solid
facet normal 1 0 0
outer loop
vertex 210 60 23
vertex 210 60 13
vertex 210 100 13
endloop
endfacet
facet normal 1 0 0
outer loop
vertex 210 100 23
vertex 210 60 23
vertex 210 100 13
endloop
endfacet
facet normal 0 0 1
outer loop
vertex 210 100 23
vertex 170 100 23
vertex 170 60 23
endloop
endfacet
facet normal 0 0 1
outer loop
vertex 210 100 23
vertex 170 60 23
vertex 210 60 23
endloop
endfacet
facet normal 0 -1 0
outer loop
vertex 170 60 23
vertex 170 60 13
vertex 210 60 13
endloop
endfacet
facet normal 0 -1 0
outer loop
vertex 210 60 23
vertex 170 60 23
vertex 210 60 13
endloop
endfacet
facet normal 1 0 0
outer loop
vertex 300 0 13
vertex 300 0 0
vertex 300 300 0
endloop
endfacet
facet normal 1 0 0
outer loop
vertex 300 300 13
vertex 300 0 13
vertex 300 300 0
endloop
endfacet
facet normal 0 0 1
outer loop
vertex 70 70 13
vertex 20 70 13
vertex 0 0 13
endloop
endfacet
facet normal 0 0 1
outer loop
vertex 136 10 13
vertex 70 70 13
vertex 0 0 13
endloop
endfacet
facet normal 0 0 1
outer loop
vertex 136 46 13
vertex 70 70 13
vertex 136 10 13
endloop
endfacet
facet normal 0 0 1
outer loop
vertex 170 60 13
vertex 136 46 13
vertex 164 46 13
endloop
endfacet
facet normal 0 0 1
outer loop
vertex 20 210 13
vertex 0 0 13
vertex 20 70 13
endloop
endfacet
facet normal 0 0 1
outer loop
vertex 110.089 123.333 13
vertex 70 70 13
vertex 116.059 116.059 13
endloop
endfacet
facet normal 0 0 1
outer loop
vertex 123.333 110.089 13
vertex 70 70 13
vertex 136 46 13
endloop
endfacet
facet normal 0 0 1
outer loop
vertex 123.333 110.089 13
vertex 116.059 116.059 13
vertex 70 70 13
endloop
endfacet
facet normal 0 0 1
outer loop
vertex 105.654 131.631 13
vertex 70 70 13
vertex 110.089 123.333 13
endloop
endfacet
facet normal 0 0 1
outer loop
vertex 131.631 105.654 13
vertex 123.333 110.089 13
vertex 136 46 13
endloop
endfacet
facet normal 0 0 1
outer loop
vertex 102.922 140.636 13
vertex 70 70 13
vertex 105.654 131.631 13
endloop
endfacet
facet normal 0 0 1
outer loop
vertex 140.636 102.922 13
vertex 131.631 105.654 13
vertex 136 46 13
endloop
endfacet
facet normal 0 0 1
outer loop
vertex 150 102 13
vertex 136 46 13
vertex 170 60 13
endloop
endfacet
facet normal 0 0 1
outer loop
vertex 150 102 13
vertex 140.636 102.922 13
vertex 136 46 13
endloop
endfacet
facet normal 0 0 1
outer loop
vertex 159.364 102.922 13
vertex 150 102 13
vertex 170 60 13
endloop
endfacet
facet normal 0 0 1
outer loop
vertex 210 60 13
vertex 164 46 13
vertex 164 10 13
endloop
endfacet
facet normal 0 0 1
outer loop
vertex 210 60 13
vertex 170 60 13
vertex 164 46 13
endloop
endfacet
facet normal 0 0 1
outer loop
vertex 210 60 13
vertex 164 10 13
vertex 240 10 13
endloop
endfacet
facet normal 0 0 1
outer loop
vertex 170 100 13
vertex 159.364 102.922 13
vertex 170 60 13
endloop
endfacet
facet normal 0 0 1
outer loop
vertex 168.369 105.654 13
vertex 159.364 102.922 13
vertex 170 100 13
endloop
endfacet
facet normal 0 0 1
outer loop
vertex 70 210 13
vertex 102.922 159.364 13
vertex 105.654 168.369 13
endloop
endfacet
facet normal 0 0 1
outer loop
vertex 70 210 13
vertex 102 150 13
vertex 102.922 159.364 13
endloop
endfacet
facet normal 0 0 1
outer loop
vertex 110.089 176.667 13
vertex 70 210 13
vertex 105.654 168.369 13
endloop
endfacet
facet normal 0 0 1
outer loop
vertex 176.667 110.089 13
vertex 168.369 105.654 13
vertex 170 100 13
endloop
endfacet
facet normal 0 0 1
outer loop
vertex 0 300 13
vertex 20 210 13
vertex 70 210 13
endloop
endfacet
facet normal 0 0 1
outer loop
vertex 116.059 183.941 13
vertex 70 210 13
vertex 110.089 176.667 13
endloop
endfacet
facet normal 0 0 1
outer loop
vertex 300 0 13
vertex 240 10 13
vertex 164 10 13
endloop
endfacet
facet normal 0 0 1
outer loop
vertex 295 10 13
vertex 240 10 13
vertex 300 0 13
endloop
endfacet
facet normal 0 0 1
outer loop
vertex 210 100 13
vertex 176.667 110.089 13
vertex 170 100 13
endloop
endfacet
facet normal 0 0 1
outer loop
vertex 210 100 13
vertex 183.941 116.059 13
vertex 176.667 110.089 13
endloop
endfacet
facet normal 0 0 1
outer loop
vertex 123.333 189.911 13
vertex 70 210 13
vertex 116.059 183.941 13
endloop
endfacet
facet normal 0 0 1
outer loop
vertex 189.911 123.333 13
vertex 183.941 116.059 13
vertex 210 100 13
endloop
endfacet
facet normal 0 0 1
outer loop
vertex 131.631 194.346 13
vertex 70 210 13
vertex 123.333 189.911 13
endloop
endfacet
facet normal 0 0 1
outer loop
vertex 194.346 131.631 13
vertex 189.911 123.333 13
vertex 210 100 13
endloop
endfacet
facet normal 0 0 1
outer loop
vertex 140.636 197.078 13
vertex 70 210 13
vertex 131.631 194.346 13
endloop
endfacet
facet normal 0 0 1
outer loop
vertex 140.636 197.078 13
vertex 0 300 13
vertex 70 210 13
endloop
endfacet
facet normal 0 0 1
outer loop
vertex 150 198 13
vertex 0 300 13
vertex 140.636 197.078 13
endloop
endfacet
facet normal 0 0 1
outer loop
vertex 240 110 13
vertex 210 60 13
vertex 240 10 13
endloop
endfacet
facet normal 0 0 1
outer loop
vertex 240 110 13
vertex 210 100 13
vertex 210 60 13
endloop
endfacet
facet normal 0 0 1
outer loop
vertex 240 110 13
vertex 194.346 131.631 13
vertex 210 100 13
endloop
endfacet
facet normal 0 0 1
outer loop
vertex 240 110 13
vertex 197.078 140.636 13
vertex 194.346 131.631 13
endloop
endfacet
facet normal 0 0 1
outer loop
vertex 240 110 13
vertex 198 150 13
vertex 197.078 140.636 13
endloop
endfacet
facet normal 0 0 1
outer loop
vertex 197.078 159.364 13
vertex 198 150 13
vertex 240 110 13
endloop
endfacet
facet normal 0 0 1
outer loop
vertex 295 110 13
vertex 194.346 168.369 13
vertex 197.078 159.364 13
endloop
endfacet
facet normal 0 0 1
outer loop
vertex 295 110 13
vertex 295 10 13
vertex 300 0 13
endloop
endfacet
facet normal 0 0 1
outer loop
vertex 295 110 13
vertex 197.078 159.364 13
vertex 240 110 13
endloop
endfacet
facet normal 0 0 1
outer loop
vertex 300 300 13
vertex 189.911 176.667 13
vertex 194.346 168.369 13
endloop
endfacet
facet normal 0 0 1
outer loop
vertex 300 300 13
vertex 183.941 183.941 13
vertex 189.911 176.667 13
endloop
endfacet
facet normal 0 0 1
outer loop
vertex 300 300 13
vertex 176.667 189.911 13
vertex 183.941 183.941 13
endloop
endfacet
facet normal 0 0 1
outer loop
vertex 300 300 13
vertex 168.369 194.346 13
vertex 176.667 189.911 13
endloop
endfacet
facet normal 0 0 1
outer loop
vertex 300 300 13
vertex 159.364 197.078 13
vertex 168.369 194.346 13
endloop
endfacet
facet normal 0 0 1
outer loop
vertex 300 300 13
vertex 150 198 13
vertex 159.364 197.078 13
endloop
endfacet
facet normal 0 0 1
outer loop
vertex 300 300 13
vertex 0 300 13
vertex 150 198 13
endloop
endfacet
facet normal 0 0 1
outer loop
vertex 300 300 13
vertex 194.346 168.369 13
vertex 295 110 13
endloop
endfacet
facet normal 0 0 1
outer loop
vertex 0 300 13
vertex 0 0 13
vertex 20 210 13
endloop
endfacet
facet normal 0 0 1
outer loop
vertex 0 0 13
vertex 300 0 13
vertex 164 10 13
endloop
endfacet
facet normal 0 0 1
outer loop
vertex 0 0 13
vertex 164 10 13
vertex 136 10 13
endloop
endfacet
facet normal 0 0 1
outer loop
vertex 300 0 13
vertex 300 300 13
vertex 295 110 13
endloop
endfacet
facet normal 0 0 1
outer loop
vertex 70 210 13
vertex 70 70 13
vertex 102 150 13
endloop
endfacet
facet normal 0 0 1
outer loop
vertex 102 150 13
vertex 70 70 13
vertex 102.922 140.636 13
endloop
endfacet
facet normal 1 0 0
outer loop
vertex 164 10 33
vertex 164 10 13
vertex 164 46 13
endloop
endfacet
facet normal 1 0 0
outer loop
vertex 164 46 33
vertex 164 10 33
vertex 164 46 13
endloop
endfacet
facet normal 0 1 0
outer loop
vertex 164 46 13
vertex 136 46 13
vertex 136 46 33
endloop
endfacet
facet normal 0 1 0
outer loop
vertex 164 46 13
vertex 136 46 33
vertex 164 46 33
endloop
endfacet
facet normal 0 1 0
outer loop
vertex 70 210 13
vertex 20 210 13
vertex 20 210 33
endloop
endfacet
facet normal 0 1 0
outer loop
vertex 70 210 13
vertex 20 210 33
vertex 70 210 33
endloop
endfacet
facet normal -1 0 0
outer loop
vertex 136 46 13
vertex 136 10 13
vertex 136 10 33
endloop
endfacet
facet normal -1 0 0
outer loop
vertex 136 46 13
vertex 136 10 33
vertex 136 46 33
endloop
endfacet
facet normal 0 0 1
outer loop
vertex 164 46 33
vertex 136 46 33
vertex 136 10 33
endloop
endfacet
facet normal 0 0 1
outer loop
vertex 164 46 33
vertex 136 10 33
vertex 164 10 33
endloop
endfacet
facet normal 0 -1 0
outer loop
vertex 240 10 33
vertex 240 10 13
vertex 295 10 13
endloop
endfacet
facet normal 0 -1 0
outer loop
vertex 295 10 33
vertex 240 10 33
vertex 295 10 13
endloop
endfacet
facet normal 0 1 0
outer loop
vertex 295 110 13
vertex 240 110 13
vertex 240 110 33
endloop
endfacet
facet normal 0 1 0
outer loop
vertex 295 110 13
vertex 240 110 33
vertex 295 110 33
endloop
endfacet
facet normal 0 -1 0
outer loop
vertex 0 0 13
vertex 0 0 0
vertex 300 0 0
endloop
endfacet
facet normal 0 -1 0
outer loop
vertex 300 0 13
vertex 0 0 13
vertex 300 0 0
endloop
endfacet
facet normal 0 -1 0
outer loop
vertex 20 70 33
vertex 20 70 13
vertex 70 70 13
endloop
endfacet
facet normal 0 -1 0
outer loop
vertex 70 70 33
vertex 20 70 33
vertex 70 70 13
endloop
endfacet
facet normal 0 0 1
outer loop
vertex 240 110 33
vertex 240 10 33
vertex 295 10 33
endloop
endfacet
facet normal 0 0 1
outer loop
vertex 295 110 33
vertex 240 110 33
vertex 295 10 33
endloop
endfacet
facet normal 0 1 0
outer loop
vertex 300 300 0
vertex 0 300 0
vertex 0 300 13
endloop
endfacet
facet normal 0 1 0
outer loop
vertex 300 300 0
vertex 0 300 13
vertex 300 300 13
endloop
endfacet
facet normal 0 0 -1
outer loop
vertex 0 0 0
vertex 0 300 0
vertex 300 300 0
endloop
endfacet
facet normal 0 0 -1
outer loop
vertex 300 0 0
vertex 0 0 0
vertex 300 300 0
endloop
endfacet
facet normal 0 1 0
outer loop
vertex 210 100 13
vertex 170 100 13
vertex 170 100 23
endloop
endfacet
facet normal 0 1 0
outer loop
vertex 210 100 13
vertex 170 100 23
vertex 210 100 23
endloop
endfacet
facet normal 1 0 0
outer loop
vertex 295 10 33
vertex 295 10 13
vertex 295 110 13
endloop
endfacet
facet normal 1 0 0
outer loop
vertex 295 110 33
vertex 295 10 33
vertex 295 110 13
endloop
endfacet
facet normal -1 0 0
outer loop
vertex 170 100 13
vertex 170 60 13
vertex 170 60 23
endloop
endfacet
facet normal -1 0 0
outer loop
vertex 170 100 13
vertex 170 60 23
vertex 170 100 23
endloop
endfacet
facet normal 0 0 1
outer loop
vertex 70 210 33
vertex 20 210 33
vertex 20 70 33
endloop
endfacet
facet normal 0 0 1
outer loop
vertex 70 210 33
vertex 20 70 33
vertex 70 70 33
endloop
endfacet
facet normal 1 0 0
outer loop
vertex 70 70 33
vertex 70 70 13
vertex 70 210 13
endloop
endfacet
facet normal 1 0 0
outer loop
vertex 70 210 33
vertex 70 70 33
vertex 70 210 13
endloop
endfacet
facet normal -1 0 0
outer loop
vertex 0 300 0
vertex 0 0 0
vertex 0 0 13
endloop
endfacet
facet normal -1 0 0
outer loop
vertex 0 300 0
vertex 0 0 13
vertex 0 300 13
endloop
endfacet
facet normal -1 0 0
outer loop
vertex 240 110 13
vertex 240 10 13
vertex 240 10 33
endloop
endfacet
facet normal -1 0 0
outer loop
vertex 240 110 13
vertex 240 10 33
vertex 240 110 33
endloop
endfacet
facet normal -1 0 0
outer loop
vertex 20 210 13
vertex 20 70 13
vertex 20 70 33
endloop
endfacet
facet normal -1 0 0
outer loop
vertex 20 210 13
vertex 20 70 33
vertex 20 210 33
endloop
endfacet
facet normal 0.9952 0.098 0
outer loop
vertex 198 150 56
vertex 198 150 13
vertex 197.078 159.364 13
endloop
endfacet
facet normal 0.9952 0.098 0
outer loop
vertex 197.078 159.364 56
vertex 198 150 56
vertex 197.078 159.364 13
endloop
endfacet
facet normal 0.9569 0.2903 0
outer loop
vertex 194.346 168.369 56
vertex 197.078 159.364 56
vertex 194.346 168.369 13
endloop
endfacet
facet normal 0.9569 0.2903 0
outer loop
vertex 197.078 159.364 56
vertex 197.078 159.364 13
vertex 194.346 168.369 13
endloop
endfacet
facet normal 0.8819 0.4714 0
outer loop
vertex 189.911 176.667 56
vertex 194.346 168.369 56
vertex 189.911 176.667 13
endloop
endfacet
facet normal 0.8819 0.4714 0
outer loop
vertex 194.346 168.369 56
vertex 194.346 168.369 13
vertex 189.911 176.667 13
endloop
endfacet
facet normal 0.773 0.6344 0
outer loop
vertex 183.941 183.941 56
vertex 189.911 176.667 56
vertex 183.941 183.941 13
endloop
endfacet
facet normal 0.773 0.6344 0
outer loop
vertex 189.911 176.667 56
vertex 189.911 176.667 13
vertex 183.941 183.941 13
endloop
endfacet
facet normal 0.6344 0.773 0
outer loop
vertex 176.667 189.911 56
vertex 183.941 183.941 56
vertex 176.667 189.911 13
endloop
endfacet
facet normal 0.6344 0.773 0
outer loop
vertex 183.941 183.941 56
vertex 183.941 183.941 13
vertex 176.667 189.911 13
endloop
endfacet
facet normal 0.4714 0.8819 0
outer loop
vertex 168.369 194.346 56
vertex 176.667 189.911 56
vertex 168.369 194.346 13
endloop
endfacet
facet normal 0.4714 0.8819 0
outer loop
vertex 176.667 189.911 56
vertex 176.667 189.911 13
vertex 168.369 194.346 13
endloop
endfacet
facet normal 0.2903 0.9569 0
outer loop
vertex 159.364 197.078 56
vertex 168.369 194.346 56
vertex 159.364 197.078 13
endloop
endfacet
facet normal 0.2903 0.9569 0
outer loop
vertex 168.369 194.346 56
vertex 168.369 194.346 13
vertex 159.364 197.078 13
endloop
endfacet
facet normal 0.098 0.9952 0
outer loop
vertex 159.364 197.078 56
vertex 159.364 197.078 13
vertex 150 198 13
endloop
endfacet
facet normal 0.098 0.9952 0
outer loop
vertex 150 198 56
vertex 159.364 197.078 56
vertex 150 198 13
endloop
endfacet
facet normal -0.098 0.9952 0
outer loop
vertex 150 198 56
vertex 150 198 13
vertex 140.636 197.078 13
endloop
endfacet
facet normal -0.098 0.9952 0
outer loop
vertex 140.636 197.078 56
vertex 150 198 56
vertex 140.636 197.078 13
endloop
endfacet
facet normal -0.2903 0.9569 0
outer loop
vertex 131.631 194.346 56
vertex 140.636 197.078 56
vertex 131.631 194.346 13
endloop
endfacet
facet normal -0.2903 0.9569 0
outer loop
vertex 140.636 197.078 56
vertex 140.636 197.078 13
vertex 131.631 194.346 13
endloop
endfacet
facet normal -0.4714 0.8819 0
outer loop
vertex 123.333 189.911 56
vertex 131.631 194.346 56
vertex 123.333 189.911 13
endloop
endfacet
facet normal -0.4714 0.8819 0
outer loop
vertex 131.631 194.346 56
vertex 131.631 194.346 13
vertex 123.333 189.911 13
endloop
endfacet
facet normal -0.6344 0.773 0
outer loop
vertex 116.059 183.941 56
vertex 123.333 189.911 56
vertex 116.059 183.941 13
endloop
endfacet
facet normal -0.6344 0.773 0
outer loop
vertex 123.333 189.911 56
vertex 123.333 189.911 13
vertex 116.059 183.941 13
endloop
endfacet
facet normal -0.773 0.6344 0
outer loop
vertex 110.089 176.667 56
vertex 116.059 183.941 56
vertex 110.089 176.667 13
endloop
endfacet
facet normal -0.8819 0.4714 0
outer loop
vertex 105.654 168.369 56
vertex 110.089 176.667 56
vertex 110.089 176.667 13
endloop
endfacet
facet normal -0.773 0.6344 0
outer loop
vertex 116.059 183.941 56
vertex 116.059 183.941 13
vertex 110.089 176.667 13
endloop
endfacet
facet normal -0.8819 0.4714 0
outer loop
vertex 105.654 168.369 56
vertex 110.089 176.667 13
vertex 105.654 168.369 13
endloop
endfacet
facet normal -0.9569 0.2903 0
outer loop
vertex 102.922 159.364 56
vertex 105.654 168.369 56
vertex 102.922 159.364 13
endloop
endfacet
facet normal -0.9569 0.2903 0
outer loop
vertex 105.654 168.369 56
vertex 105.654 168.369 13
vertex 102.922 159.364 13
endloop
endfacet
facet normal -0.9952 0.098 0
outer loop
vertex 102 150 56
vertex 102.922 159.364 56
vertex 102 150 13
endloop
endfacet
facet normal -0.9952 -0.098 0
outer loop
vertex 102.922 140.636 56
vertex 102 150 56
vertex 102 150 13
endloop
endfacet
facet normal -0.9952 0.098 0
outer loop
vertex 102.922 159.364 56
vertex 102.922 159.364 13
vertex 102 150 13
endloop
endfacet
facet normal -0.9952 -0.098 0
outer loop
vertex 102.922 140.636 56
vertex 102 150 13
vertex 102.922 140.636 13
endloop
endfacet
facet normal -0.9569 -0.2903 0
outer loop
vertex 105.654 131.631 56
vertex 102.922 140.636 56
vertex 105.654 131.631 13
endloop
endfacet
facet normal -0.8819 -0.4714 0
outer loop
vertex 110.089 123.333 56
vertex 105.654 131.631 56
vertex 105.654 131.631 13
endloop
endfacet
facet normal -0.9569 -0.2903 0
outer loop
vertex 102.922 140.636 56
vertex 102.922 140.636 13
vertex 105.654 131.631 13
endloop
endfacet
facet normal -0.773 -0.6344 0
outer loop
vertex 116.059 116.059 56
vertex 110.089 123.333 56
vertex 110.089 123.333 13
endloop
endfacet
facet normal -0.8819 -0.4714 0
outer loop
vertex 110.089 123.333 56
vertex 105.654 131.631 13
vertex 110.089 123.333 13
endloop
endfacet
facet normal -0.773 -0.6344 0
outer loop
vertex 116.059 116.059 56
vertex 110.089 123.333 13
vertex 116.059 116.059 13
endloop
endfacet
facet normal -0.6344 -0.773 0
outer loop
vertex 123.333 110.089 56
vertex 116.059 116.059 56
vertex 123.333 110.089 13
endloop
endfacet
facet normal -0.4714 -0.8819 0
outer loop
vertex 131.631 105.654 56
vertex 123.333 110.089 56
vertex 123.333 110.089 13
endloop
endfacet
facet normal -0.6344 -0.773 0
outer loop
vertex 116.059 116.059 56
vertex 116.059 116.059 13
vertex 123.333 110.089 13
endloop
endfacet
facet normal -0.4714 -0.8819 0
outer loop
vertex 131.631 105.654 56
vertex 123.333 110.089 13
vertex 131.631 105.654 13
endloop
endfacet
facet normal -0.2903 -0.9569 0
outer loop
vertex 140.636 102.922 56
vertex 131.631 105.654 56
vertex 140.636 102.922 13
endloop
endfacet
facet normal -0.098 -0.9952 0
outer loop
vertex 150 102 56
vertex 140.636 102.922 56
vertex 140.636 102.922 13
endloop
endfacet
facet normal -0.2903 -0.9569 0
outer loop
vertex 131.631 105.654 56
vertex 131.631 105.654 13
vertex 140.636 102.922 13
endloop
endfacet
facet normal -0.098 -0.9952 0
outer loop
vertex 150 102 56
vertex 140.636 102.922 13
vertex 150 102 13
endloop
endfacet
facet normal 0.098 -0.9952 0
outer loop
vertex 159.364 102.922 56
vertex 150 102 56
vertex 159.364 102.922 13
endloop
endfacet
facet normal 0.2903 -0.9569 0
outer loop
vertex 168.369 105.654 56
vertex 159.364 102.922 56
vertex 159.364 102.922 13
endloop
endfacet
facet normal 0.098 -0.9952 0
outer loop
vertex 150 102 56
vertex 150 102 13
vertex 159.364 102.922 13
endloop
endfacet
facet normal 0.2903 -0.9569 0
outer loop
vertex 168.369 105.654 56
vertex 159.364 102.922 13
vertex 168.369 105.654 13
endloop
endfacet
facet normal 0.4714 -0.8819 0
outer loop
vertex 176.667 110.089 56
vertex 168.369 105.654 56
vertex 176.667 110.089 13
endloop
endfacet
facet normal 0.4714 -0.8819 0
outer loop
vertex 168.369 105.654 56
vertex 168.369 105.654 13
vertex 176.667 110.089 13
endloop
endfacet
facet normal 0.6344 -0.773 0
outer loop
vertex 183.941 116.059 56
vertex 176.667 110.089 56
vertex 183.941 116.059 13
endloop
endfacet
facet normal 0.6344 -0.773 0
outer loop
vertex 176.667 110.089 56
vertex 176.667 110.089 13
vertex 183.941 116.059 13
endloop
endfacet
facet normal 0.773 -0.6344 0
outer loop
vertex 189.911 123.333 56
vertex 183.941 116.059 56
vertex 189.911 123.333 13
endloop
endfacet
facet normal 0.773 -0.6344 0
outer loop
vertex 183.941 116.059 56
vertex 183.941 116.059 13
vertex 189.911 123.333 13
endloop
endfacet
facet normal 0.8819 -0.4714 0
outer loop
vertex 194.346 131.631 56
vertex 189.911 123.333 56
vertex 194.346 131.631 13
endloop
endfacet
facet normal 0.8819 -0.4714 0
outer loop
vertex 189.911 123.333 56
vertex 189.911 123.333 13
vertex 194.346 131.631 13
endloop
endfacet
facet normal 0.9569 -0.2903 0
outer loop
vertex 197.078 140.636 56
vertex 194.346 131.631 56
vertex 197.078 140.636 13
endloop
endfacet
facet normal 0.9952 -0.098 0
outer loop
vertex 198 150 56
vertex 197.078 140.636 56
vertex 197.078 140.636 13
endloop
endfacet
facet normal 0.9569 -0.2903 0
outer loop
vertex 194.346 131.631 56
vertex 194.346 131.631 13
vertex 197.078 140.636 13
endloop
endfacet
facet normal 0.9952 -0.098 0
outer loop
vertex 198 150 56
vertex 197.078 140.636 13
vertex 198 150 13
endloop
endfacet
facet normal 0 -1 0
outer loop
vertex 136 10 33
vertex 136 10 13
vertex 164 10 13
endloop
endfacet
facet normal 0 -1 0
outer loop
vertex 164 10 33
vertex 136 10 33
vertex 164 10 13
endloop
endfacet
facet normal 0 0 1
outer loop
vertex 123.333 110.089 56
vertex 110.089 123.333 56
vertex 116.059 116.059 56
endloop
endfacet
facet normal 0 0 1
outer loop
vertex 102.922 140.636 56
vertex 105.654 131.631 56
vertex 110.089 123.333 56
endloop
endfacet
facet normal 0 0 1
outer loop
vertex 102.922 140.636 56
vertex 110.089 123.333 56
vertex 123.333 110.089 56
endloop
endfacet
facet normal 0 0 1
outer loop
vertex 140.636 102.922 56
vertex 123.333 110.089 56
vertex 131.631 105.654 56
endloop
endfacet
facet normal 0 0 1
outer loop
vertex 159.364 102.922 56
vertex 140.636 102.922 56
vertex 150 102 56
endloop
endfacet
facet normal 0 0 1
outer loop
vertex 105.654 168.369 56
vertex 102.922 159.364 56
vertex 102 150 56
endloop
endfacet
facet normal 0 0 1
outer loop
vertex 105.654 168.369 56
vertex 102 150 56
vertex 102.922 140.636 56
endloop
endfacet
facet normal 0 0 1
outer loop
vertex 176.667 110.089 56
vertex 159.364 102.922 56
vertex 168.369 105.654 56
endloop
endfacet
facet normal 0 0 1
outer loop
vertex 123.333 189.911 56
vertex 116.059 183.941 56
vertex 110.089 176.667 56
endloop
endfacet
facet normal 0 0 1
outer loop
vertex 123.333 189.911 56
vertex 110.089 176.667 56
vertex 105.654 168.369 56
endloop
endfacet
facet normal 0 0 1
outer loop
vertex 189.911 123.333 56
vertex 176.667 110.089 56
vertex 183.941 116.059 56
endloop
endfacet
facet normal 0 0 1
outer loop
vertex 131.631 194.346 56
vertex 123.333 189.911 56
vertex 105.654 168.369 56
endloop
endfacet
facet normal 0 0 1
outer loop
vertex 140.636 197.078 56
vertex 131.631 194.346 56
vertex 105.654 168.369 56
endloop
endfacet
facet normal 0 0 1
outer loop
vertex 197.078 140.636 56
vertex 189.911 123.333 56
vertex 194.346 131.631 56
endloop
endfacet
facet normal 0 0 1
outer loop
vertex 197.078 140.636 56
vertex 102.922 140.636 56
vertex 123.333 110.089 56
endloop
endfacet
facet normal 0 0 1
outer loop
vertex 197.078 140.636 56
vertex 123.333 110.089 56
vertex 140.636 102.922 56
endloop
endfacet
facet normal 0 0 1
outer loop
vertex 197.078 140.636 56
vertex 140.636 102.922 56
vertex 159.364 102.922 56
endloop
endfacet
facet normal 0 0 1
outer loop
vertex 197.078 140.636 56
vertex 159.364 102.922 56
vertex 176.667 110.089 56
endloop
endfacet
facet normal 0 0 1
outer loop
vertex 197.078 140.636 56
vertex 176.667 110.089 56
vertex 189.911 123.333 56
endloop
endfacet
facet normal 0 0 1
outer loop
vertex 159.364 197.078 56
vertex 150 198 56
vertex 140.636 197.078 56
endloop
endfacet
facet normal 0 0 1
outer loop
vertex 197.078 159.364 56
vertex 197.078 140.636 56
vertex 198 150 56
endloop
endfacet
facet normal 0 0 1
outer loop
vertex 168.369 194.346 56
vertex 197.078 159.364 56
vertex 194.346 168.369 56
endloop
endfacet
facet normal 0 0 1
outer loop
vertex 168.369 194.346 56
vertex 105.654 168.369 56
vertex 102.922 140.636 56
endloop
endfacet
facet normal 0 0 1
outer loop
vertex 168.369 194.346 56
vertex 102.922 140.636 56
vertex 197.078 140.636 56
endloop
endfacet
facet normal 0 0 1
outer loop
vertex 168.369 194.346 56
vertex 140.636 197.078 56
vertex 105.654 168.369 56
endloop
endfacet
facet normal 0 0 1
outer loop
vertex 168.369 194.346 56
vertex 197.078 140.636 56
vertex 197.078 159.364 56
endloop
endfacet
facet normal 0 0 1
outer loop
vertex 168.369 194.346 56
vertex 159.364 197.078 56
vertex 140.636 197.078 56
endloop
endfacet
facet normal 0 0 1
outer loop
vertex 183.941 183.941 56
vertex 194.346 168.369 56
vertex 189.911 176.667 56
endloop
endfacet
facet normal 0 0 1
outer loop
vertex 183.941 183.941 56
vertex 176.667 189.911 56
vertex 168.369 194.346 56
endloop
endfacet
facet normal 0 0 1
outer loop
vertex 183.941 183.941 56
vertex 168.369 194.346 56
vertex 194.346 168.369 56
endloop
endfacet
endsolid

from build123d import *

# Parameters (mm, degrees)
CYLINDER_R     = 48
CYLINDER_DEPTH = 43
BOX001_W       = 50
BOX001_H       = 140
BOX001_DEPTH   = 20
BOX002_W       = 55
BOX002_H       = 100
BOX002_DEPTH   = 20
BOX003_W       = 28
BOX003_H       = 36
BOX003_DEPTH   = 20
BOX004_W       = 40
BOX004_H       = 40
BOX004_DEPTH   = 10
BOX_W          = 300
BOX_H          = 300
BOX_DEPTH      = 13


with BuildPart() as cylinder:
    # Cylinder → Cylinder (new body)
    with BuildSketch(Plane(origin=(150, 150, 13), x_dir=(1, 0, 0), z_dir=(0, 0, 1))):
        Circle(CYLINDER_R)
    extrude(amount=CYLINDER_DEPTH)


with BuildPart() as battery:
    # Box001 → Box001 (new body)
    with BuildSketch(Plane(origin=(20, 70, 13), x_dir=(1, 0, 0), z_dir=(0, 0, 1))):
        with Locations((25, 70)):
            Rectangle(BOX001_W, BOX001_H)
    extrude(amount=BOX001_DEPTH)


with BuildPart() as arduino:
    # Box002 → Box002 (new body)
    with BuildSketch(Plane(origin=(240, 10, 13), x_dir=(1, 0, 0), z_dir=(0, 0, 1))):
        with Locations((27.5, 50)):
            Rectangle(BOX002_W, BOX002_H)
    extrude(amount=BOX002_DEPTH)


with BuildPart() as maestro:
    # Box003 → Box003 (new body)
    with BuildSketch(Plane(origin=(136, 10, 13), x_dir=(1, 0, 0), z_dir=(0, 0, 1))):
        with Locations((14, 18)):
            Rectangle(BOX003_W, BOX003_H)
    extrude(amount=BOX003_DEPTH)


with BuildPart() as ubec:
    # Box004 → Box004 (new body)
    with BuildSketch(Plane(origin=(170, 60, 13), x_dir=(1, 0, 0), z_dir=(0, 0, 1))):
        with Locations((20, 20)):
            Rectangle(BOX004_W, BOX004_H)
    extrude(amount=BOX004_DEPTH)


with BuildPart() as base:
    # Box → Box (new body)
    with BuildSketch(Plane.XY):
        with Locations((150, 150)):
            Rectangle(BOX_W, BOX_H)
    extrude(amount=BOX_DEPTH)

    # Fusion: union Cylinder, Battery, Arduino, Maestro, UBEC
    add(cylinder.part)
    add(battery.part)
    add(arduino.part)
    add(maestro.part)
    add(ubec.part)


solid = base.part
